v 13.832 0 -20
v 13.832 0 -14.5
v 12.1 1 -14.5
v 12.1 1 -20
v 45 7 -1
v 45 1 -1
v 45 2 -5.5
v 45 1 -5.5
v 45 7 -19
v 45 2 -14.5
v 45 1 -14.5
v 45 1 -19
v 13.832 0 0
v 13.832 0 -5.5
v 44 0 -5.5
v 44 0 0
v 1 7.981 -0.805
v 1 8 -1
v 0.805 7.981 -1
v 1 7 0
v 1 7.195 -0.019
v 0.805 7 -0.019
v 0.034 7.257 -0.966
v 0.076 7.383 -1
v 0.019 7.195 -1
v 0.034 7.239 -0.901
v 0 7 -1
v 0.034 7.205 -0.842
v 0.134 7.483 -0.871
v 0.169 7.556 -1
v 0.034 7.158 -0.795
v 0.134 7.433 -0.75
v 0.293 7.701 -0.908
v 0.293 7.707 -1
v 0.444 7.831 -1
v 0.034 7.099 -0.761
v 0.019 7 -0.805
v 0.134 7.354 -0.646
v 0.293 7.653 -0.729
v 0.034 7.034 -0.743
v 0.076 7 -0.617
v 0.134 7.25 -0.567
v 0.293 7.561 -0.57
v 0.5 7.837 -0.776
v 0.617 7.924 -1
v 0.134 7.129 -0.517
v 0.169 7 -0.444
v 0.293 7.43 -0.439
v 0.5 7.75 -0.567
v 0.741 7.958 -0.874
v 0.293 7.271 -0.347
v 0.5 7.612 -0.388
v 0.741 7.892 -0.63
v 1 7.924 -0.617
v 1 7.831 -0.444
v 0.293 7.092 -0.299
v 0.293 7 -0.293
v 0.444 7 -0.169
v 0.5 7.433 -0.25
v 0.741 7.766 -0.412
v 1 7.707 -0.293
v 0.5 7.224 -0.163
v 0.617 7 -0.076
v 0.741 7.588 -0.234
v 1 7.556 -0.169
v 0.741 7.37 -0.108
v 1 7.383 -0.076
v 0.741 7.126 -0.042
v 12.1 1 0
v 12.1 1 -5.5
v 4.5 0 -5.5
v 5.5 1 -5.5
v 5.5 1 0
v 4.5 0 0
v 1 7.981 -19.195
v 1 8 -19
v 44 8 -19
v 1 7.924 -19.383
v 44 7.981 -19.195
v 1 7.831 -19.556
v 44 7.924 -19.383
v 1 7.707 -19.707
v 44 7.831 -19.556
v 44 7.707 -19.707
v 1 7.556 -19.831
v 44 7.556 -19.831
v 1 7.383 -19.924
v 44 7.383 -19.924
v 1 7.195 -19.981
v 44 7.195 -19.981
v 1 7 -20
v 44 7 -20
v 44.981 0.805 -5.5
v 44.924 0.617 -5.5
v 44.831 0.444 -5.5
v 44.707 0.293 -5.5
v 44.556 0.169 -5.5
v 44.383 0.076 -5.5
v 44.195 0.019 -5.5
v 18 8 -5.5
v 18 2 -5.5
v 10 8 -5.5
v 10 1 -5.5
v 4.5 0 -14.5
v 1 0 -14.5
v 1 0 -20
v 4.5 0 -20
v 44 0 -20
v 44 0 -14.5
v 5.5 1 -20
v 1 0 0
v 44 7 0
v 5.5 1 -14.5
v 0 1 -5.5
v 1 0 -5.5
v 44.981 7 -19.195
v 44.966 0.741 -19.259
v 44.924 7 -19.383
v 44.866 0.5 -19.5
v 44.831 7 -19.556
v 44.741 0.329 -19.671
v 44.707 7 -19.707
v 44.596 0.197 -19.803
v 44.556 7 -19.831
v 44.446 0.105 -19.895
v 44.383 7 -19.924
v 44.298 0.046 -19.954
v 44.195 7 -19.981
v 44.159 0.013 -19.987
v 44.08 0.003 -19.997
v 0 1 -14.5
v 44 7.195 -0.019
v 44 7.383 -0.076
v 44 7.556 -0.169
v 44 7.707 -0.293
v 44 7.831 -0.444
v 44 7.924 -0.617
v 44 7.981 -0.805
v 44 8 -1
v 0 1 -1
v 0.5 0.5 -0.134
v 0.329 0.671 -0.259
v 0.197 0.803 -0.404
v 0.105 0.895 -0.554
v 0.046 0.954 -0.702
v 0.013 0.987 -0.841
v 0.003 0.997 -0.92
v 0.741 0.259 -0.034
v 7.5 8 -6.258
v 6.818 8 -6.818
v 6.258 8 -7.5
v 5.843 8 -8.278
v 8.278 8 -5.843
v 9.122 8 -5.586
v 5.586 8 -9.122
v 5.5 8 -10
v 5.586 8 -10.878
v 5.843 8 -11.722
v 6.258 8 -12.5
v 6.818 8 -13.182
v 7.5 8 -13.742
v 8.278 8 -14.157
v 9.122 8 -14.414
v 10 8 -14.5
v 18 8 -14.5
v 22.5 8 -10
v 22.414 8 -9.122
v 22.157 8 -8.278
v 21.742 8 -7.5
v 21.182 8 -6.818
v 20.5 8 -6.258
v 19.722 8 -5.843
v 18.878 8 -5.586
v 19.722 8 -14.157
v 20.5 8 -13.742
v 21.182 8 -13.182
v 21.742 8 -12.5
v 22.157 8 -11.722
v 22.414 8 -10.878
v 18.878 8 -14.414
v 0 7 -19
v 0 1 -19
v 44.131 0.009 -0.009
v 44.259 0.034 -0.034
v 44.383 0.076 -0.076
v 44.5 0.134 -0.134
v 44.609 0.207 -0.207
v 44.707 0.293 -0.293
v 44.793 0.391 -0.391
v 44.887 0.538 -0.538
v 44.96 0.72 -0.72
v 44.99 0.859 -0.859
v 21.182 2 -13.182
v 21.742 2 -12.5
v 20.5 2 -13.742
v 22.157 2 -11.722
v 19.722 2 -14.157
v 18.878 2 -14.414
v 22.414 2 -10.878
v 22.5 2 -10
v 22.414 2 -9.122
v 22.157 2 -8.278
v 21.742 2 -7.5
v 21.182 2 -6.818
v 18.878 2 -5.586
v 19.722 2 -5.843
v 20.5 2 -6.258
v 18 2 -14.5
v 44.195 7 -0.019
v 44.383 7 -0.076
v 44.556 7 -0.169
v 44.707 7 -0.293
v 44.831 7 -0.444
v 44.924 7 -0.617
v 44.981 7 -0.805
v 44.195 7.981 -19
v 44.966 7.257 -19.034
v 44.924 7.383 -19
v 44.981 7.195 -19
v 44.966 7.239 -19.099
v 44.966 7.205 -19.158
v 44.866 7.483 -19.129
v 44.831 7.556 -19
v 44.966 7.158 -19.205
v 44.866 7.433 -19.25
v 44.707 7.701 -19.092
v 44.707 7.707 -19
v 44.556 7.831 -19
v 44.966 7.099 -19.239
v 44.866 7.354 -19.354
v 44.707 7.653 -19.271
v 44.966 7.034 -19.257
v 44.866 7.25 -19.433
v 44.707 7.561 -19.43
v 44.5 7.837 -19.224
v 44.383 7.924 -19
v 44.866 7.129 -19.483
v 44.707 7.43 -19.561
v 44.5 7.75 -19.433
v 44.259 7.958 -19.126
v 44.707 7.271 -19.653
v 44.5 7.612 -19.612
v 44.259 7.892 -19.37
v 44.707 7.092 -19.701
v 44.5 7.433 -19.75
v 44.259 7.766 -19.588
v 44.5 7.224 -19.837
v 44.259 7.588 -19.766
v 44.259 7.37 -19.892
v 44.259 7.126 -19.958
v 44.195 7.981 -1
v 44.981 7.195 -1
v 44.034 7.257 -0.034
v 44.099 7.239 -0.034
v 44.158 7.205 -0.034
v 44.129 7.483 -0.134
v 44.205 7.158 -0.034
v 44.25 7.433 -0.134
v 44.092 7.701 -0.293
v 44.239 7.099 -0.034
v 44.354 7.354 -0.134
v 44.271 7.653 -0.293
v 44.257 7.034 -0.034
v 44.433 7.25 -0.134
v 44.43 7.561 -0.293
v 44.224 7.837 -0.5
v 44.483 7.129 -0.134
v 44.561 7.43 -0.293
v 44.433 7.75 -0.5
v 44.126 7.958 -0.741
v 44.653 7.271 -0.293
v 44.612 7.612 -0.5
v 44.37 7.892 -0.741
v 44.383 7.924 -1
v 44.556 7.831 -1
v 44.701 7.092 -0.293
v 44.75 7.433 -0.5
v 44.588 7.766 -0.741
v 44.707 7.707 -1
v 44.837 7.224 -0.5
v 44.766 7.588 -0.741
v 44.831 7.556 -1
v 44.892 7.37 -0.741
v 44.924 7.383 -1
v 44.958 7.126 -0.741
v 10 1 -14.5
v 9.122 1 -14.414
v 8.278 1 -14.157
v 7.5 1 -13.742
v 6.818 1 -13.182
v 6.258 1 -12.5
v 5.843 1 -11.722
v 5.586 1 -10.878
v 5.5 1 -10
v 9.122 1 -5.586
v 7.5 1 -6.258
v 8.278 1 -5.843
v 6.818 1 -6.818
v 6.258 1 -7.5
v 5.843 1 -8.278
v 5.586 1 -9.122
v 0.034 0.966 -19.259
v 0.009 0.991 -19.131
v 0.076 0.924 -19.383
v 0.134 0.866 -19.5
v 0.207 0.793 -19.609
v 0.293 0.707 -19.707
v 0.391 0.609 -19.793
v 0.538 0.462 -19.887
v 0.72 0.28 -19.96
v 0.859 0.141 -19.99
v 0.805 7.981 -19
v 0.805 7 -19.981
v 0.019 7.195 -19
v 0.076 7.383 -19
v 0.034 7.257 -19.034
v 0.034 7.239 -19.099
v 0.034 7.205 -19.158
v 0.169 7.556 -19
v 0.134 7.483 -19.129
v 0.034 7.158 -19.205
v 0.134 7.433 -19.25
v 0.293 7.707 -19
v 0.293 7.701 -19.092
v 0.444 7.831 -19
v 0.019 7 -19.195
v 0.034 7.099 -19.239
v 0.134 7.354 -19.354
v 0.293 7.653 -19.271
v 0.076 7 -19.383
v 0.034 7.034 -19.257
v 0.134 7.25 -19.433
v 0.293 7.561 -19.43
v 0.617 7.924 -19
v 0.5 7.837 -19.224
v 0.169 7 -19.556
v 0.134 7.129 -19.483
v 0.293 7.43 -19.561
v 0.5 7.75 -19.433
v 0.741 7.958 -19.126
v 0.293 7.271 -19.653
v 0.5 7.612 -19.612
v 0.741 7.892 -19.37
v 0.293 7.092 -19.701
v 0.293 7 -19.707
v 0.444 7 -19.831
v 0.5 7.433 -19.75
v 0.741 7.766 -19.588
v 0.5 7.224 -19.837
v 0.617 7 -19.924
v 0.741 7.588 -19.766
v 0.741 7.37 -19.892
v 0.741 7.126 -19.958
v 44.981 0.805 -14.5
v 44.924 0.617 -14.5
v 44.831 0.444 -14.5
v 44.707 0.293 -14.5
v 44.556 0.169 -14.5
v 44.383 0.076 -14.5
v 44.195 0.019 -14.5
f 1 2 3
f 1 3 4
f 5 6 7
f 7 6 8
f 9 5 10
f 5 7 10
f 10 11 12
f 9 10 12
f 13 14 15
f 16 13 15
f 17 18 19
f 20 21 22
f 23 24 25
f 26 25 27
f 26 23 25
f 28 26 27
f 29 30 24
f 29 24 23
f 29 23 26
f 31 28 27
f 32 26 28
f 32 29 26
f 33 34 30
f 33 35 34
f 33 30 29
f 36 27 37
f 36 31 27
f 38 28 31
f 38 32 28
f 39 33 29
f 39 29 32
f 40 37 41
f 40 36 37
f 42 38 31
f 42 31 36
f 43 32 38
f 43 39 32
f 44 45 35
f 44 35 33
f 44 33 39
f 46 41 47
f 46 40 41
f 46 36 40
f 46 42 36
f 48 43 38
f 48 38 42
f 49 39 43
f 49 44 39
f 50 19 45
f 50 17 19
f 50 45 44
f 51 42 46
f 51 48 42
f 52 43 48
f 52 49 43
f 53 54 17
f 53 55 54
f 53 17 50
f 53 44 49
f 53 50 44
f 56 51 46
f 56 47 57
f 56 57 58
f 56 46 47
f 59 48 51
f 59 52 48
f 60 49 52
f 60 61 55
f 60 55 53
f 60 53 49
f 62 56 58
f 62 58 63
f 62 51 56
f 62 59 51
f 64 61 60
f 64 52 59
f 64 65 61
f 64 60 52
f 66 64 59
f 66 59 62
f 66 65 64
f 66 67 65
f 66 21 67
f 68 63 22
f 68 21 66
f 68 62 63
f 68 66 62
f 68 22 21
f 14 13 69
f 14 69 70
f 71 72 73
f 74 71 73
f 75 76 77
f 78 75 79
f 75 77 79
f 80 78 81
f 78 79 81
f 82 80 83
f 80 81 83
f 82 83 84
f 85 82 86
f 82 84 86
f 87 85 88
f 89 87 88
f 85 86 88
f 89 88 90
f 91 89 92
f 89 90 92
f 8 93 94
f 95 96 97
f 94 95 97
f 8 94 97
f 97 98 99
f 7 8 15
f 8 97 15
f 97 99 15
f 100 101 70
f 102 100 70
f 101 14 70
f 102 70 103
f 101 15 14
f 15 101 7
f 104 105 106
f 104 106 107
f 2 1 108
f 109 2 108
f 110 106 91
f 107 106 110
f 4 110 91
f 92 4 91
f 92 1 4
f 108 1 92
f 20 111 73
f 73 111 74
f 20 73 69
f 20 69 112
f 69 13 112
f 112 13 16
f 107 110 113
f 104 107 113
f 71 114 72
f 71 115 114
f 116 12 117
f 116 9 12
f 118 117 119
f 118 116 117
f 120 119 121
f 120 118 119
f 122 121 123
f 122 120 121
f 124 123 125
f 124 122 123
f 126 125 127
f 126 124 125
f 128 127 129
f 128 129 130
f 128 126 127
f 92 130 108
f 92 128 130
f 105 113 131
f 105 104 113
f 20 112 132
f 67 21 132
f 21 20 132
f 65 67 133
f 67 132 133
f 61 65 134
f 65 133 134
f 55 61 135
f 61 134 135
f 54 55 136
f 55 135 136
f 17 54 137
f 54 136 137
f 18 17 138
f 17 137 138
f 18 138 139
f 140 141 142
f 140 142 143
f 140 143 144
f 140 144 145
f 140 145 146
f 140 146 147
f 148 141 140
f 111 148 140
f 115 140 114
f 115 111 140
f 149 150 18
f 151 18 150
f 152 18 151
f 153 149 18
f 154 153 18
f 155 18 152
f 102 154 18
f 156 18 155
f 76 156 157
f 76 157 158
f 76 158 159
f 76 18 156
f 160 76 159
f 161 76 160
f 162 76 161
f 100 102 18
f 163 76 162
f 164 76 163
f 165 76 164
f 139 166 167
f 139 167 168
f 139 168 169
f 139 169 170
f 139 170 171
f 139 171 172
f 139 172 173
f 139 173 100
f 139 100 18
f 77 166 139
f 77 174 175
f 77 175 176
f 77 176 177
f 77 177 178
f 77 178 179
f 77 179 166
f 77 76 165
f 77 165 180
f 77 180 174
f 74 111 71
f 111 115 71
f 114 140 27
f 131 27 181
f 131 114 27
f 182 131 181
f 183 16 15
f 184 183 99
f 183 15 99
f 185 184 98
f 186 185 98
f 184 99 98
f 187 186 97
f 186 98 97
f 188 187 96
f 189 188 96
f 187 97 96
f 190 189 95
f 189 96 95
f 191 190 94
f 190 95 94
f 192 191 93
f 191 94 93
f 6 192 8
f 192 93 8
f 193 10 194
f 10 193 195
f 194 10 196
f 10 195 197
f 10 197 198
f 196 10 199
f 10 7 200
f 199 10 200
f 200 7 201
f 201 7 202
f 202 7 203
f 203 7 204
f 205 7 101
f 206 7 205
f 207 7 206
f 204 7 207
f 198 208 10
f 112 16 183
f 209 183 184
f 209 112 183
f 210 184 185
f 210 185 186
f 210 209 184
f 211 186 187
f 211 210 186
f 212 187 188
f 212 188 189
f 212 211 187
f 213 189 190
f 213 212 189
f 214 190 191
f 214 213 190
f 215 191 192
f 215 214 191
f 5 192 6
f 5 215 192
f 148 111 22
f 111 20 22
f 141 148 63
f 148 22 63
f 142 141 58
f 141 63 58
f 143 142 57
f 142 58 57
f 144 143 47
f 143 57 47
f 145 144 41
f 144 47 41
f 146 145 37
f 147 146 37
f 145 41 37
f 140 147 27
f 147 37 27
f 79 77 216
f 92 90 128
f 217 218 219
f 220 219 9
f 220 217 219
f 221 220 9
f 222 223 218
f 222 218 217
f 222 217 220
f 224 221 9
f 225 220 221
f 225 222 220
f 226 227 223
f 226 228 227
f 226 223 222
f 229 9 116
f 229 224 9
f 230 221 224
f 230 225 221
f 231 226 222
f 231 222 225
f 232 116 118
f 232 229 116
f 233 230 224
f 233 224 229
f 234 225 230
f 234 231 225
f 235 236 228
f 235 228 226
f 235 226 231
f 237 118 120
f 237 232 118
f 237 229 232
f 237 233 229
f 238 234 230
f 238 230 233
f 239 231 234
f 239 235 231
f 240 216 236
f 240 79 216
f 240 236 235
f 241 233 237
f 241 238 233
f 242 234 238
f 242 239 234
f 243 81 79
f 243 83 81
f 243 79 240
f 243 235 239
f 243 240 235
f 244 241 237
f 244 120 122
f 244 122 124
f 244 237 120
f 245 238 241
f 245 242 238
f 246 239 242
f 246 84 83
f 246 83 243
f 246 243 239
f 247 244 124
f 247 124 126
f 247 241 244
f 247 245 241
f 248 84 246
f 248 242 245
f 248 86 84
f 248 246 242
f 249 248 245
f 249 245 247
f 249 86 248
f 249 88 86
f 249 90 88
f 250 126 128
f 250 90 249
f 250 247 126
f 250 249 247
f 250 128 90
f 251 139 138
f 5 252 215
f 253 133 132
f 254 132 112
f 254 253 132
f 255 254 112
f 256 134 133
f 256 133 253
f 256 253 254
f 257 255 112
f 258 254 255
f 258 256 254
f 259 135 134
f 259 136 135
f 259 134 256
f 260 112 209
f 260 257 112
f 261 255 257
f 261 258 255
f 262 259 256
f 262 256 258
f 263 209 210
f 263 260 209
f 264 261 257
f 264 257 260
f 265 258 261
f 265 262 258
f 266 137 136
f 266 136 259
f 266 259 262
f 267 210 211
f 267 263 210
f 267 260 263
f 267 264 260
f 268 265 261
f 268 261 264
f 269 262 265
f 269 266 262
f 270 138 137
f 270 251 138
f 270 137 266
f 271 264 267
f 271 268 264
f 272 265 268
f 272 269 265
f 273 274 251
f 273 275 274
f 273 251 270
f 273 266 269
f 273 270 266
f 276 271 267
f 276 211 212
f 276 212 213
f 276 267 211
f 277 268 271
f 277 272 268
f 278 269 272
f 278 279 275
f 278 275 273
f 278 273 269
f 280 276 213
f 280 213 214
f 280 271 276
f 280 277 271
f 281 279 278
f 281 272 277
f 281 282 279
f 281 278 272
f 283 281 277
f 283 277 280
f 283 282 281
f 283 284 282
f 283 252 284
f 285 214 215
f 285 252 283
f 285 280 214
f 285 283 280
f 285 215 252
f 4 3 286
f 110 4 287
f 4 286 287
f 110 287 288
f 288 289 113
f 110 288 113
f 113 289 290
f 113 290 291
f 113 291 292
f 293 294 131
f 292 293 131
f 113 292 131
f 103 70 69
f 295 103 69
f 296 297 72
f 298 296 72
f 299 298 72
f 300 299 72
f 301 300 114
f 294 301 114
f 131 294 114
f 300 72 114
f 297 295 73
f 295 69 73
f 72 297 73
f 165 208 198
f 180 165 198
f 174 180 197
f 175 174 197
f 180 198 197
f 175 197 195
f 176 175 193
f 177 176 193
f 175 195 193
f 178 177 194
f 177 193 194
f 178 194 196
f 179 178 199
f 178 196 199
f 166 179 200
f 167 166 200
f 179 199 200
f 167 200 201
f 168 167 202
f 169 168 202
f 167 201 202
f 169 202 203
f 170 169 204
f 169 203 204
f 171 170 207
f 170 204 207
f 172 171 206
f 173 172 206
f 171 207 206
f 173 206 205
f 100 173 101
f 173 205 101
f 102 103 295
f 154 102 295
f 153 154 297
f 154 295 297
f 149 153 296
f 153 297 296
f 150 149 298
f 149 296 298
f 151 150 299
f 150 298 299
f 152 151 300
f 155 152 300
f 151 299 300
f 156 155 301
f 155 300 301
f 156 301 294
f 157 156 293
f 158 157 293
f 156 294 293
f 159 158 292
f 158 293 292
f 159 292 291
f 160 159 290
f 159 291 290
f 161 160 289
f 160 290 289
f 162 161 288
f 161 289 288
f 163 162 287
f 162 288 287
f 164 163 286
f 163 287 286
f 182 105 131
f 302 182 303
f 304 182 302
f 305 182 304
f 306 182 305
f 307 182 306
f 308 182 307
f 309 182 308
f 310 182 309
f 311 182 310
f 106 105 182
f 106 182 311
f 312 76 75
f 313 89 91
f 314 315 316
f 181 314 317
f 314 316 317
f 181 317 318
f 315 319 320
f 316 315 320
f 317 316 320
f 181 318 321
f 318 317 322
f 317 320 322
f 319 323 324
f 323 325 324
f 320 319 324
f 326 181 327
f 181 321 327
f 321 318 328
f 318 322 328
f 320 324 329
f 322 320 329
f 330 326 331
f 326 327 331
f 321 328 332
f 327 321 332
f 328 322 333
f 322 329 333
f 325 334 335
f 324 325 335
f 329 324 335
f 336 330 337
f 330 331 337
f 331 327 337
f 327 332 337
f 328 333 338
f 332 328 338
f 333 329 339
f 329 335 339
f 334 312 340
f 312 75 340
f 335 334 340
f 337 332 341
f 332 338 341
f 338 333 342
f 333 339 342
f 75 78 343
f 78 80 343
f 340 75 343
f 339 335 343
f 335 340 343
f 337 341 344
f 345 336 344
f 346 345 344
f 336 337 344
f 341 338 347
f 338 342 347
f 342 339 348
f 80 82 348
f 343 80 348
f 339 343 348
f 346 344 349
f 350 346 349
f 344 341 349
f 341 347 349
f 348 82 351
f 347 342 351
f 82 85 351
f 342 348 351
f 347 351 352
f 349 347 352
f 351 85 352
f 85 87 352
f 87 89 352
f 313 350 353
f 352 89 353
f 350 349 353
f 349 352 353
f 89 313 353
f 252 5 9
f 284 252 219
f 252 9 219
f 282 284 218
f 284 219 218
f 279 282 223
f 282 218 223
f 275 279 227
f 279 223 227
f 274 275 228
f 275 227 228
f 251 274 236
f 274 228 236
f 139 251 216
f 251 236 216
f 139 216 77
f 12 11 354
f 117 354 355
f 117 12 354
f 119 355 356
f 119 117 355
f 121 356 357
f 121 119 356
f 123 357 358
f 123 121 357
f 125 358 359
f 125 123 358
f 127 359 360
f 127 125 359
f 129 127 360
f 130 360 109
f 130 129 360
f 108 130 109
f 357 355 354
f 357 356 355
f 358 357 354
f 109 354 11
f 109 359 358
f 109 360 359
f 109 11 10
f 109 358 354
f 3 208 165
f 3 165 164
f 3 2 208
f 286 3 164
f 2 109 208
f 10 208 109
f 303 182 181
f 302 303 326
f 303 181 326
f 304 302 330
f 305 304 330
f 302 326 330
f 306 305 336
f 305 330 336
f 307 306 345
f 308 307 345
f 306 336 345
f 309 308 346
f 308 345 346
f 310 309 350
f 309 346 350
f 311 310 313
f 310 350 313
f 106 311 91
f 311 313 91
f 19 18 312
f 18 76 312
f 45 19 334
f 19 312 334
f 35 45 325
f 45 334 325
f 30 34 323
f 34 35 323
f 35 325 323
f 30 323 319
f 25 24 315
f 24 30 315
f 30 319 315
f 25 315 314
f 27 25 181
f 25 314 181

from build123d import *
from OCP.BRepFilletAPI import BRepFilletAPI_MakeChamfer

# Parameters (mm, degrees)
SKETCH_1_W          = 45
SKETCH_1_H          = 20
EXTRUDE_1_DEPTH     = 8
CUT_EXTRUDE_1_DEPTH = 2
CUT_EXTRUDE_2_DEPTH = 1
CHAMFER_1_SIZE      = 1
CHAMFER_2_SIZE      = 1
CHAMFER_2_SIZE_2    = 1.732050808
FILLET_1_R          = 1


with BuildPart() as part:
    # 草图1 → 凸台-拉伸1 (new body)
    with BuildSketch(Plane(origin=(0, 0, 0), x_dir=(1, 0, 0), z_dir=(0, 1, 0))):
        with Locations((22.5, 10)):
            Rectangle(SKETCH_1_W, SKETCH_1_H)
        with BuildLine():
            Line((18, 5.5), (10, 5.5))
            ThreePointArc((10, 5.5), (5.5, 10), (10, 14.5))
            Line((10, 14.5), (18, 14.5))
            ThreePointArc((18, 14.5), (22.5, 10), (18, 5.5))
        make_face(mode=Mode.SUBTRACT)
    extrude(amount=EXTRUDE_1_DEPTH)

    # 草图2 → 切除-拉伸1 (cut)
    with BuildSketch(Plane.XZ):
        with BuildLine():
            Line((45, -5.5), (45, -14.5))
            Line((45, -14.5), (10, -14.5))
            ThreePointArc((10, -14.5), (5.5, -10), (10, -5.5))
            Line((10, -5.5), (45, -5.5))
        make_face()
    extrude(amount=-CUT_EXTRUDE_1_DEPTH, mode=Mode.SUBTRACT)

    # 草图3 → 切除-拉伸2 (cut)
    with BuildSketch(Plane.XZ):
        Polygon((0, -5.5), (5.5, -5.5), (5.5, 0), (12.1, 0), (12.1, -20), (5.5, -20), (5.5, -14.5), (0, -14.5), align=None)
    extrude(amount=-CUT_EXTRUDE_2_DEPTH, mode=Mode.SUBTRACT)

    # 倒角1
    chamfer_1_edges = [part.edges().sort_by_distance(p)[0] for p in [
        (0, 0, -17.25),
        (5.5, 0, -17.25),
        (5.5, 0, -2.75),
        (0, 0, -2.75),
    ]]
    chamfer(chamfer_1_edges, length=CHAMFER_1_SIZE - 0.0001)  # a hair under: the kernel refuses the full size

    # 倒角2
    chamfer_2_edges_1 = [part.edges().sort_by_distance(p)[0] for p in [
        (12.1, 0, -17.25),
    ]]
    chamfer_2_side_1 = [part.faces().sort_by_distance(p)[0] for p in [
        (12.1, 0.02, -17.25),
    ]]
    chamfer_2_edges_2 = [part.edges().sort_by_distance(p)[0] for p in [
        (12.1, 0, -2.75),
    ]]
    chamfer_2_side_2 = [part.faces().sort_by_distance(p)[0] for p in [
        (12.1, 0.02, -2.75),
    ]]
    chamfer_2 = BRepFilletAPI_MakeChamfer(part.part.solid().wrapped)
    for e in chamfer_2_edges_1:
        chamfer_2.Add(CHAMFER_2_SIZE - 0.0001, CHAMFER_2_SIZE_2 - 0.0001, e.wrapped, chamfer_2_side_1[0].wrapped)
    for e in chamfer_2_edges_2:
        chamfer_2.Add(CHAMFER_2_SIZE - 0.0001, CHAMFER_2_SIZE_2 - 0.0001, e.wrapped, chamfer_2_side_2[0].wrapped)
    add(Compound.cast(chamfer_2.Shape()), mode=Mode.REPLACE)  # a hair under: the kernel refuses the full size

    # 圆角1
    fillet_1_edges = [part.edges().sort_by_distance(p)[0] for p in [
        (22.5, 8, -20),
        (45, 8, -10),
        (22.5, 8, 0),
        (0, 8, -10),
        (45, 4, 0),
        (45, 4, -20),
        (0, 4.49995, -20),
        (0, 4.49995, 0),
        (45, 0, -17.25),
        (45, 0, -2.75),
    ]]
    fillet(fillet_1_edges, radius=FILLET_1_R)


solid = part.part
